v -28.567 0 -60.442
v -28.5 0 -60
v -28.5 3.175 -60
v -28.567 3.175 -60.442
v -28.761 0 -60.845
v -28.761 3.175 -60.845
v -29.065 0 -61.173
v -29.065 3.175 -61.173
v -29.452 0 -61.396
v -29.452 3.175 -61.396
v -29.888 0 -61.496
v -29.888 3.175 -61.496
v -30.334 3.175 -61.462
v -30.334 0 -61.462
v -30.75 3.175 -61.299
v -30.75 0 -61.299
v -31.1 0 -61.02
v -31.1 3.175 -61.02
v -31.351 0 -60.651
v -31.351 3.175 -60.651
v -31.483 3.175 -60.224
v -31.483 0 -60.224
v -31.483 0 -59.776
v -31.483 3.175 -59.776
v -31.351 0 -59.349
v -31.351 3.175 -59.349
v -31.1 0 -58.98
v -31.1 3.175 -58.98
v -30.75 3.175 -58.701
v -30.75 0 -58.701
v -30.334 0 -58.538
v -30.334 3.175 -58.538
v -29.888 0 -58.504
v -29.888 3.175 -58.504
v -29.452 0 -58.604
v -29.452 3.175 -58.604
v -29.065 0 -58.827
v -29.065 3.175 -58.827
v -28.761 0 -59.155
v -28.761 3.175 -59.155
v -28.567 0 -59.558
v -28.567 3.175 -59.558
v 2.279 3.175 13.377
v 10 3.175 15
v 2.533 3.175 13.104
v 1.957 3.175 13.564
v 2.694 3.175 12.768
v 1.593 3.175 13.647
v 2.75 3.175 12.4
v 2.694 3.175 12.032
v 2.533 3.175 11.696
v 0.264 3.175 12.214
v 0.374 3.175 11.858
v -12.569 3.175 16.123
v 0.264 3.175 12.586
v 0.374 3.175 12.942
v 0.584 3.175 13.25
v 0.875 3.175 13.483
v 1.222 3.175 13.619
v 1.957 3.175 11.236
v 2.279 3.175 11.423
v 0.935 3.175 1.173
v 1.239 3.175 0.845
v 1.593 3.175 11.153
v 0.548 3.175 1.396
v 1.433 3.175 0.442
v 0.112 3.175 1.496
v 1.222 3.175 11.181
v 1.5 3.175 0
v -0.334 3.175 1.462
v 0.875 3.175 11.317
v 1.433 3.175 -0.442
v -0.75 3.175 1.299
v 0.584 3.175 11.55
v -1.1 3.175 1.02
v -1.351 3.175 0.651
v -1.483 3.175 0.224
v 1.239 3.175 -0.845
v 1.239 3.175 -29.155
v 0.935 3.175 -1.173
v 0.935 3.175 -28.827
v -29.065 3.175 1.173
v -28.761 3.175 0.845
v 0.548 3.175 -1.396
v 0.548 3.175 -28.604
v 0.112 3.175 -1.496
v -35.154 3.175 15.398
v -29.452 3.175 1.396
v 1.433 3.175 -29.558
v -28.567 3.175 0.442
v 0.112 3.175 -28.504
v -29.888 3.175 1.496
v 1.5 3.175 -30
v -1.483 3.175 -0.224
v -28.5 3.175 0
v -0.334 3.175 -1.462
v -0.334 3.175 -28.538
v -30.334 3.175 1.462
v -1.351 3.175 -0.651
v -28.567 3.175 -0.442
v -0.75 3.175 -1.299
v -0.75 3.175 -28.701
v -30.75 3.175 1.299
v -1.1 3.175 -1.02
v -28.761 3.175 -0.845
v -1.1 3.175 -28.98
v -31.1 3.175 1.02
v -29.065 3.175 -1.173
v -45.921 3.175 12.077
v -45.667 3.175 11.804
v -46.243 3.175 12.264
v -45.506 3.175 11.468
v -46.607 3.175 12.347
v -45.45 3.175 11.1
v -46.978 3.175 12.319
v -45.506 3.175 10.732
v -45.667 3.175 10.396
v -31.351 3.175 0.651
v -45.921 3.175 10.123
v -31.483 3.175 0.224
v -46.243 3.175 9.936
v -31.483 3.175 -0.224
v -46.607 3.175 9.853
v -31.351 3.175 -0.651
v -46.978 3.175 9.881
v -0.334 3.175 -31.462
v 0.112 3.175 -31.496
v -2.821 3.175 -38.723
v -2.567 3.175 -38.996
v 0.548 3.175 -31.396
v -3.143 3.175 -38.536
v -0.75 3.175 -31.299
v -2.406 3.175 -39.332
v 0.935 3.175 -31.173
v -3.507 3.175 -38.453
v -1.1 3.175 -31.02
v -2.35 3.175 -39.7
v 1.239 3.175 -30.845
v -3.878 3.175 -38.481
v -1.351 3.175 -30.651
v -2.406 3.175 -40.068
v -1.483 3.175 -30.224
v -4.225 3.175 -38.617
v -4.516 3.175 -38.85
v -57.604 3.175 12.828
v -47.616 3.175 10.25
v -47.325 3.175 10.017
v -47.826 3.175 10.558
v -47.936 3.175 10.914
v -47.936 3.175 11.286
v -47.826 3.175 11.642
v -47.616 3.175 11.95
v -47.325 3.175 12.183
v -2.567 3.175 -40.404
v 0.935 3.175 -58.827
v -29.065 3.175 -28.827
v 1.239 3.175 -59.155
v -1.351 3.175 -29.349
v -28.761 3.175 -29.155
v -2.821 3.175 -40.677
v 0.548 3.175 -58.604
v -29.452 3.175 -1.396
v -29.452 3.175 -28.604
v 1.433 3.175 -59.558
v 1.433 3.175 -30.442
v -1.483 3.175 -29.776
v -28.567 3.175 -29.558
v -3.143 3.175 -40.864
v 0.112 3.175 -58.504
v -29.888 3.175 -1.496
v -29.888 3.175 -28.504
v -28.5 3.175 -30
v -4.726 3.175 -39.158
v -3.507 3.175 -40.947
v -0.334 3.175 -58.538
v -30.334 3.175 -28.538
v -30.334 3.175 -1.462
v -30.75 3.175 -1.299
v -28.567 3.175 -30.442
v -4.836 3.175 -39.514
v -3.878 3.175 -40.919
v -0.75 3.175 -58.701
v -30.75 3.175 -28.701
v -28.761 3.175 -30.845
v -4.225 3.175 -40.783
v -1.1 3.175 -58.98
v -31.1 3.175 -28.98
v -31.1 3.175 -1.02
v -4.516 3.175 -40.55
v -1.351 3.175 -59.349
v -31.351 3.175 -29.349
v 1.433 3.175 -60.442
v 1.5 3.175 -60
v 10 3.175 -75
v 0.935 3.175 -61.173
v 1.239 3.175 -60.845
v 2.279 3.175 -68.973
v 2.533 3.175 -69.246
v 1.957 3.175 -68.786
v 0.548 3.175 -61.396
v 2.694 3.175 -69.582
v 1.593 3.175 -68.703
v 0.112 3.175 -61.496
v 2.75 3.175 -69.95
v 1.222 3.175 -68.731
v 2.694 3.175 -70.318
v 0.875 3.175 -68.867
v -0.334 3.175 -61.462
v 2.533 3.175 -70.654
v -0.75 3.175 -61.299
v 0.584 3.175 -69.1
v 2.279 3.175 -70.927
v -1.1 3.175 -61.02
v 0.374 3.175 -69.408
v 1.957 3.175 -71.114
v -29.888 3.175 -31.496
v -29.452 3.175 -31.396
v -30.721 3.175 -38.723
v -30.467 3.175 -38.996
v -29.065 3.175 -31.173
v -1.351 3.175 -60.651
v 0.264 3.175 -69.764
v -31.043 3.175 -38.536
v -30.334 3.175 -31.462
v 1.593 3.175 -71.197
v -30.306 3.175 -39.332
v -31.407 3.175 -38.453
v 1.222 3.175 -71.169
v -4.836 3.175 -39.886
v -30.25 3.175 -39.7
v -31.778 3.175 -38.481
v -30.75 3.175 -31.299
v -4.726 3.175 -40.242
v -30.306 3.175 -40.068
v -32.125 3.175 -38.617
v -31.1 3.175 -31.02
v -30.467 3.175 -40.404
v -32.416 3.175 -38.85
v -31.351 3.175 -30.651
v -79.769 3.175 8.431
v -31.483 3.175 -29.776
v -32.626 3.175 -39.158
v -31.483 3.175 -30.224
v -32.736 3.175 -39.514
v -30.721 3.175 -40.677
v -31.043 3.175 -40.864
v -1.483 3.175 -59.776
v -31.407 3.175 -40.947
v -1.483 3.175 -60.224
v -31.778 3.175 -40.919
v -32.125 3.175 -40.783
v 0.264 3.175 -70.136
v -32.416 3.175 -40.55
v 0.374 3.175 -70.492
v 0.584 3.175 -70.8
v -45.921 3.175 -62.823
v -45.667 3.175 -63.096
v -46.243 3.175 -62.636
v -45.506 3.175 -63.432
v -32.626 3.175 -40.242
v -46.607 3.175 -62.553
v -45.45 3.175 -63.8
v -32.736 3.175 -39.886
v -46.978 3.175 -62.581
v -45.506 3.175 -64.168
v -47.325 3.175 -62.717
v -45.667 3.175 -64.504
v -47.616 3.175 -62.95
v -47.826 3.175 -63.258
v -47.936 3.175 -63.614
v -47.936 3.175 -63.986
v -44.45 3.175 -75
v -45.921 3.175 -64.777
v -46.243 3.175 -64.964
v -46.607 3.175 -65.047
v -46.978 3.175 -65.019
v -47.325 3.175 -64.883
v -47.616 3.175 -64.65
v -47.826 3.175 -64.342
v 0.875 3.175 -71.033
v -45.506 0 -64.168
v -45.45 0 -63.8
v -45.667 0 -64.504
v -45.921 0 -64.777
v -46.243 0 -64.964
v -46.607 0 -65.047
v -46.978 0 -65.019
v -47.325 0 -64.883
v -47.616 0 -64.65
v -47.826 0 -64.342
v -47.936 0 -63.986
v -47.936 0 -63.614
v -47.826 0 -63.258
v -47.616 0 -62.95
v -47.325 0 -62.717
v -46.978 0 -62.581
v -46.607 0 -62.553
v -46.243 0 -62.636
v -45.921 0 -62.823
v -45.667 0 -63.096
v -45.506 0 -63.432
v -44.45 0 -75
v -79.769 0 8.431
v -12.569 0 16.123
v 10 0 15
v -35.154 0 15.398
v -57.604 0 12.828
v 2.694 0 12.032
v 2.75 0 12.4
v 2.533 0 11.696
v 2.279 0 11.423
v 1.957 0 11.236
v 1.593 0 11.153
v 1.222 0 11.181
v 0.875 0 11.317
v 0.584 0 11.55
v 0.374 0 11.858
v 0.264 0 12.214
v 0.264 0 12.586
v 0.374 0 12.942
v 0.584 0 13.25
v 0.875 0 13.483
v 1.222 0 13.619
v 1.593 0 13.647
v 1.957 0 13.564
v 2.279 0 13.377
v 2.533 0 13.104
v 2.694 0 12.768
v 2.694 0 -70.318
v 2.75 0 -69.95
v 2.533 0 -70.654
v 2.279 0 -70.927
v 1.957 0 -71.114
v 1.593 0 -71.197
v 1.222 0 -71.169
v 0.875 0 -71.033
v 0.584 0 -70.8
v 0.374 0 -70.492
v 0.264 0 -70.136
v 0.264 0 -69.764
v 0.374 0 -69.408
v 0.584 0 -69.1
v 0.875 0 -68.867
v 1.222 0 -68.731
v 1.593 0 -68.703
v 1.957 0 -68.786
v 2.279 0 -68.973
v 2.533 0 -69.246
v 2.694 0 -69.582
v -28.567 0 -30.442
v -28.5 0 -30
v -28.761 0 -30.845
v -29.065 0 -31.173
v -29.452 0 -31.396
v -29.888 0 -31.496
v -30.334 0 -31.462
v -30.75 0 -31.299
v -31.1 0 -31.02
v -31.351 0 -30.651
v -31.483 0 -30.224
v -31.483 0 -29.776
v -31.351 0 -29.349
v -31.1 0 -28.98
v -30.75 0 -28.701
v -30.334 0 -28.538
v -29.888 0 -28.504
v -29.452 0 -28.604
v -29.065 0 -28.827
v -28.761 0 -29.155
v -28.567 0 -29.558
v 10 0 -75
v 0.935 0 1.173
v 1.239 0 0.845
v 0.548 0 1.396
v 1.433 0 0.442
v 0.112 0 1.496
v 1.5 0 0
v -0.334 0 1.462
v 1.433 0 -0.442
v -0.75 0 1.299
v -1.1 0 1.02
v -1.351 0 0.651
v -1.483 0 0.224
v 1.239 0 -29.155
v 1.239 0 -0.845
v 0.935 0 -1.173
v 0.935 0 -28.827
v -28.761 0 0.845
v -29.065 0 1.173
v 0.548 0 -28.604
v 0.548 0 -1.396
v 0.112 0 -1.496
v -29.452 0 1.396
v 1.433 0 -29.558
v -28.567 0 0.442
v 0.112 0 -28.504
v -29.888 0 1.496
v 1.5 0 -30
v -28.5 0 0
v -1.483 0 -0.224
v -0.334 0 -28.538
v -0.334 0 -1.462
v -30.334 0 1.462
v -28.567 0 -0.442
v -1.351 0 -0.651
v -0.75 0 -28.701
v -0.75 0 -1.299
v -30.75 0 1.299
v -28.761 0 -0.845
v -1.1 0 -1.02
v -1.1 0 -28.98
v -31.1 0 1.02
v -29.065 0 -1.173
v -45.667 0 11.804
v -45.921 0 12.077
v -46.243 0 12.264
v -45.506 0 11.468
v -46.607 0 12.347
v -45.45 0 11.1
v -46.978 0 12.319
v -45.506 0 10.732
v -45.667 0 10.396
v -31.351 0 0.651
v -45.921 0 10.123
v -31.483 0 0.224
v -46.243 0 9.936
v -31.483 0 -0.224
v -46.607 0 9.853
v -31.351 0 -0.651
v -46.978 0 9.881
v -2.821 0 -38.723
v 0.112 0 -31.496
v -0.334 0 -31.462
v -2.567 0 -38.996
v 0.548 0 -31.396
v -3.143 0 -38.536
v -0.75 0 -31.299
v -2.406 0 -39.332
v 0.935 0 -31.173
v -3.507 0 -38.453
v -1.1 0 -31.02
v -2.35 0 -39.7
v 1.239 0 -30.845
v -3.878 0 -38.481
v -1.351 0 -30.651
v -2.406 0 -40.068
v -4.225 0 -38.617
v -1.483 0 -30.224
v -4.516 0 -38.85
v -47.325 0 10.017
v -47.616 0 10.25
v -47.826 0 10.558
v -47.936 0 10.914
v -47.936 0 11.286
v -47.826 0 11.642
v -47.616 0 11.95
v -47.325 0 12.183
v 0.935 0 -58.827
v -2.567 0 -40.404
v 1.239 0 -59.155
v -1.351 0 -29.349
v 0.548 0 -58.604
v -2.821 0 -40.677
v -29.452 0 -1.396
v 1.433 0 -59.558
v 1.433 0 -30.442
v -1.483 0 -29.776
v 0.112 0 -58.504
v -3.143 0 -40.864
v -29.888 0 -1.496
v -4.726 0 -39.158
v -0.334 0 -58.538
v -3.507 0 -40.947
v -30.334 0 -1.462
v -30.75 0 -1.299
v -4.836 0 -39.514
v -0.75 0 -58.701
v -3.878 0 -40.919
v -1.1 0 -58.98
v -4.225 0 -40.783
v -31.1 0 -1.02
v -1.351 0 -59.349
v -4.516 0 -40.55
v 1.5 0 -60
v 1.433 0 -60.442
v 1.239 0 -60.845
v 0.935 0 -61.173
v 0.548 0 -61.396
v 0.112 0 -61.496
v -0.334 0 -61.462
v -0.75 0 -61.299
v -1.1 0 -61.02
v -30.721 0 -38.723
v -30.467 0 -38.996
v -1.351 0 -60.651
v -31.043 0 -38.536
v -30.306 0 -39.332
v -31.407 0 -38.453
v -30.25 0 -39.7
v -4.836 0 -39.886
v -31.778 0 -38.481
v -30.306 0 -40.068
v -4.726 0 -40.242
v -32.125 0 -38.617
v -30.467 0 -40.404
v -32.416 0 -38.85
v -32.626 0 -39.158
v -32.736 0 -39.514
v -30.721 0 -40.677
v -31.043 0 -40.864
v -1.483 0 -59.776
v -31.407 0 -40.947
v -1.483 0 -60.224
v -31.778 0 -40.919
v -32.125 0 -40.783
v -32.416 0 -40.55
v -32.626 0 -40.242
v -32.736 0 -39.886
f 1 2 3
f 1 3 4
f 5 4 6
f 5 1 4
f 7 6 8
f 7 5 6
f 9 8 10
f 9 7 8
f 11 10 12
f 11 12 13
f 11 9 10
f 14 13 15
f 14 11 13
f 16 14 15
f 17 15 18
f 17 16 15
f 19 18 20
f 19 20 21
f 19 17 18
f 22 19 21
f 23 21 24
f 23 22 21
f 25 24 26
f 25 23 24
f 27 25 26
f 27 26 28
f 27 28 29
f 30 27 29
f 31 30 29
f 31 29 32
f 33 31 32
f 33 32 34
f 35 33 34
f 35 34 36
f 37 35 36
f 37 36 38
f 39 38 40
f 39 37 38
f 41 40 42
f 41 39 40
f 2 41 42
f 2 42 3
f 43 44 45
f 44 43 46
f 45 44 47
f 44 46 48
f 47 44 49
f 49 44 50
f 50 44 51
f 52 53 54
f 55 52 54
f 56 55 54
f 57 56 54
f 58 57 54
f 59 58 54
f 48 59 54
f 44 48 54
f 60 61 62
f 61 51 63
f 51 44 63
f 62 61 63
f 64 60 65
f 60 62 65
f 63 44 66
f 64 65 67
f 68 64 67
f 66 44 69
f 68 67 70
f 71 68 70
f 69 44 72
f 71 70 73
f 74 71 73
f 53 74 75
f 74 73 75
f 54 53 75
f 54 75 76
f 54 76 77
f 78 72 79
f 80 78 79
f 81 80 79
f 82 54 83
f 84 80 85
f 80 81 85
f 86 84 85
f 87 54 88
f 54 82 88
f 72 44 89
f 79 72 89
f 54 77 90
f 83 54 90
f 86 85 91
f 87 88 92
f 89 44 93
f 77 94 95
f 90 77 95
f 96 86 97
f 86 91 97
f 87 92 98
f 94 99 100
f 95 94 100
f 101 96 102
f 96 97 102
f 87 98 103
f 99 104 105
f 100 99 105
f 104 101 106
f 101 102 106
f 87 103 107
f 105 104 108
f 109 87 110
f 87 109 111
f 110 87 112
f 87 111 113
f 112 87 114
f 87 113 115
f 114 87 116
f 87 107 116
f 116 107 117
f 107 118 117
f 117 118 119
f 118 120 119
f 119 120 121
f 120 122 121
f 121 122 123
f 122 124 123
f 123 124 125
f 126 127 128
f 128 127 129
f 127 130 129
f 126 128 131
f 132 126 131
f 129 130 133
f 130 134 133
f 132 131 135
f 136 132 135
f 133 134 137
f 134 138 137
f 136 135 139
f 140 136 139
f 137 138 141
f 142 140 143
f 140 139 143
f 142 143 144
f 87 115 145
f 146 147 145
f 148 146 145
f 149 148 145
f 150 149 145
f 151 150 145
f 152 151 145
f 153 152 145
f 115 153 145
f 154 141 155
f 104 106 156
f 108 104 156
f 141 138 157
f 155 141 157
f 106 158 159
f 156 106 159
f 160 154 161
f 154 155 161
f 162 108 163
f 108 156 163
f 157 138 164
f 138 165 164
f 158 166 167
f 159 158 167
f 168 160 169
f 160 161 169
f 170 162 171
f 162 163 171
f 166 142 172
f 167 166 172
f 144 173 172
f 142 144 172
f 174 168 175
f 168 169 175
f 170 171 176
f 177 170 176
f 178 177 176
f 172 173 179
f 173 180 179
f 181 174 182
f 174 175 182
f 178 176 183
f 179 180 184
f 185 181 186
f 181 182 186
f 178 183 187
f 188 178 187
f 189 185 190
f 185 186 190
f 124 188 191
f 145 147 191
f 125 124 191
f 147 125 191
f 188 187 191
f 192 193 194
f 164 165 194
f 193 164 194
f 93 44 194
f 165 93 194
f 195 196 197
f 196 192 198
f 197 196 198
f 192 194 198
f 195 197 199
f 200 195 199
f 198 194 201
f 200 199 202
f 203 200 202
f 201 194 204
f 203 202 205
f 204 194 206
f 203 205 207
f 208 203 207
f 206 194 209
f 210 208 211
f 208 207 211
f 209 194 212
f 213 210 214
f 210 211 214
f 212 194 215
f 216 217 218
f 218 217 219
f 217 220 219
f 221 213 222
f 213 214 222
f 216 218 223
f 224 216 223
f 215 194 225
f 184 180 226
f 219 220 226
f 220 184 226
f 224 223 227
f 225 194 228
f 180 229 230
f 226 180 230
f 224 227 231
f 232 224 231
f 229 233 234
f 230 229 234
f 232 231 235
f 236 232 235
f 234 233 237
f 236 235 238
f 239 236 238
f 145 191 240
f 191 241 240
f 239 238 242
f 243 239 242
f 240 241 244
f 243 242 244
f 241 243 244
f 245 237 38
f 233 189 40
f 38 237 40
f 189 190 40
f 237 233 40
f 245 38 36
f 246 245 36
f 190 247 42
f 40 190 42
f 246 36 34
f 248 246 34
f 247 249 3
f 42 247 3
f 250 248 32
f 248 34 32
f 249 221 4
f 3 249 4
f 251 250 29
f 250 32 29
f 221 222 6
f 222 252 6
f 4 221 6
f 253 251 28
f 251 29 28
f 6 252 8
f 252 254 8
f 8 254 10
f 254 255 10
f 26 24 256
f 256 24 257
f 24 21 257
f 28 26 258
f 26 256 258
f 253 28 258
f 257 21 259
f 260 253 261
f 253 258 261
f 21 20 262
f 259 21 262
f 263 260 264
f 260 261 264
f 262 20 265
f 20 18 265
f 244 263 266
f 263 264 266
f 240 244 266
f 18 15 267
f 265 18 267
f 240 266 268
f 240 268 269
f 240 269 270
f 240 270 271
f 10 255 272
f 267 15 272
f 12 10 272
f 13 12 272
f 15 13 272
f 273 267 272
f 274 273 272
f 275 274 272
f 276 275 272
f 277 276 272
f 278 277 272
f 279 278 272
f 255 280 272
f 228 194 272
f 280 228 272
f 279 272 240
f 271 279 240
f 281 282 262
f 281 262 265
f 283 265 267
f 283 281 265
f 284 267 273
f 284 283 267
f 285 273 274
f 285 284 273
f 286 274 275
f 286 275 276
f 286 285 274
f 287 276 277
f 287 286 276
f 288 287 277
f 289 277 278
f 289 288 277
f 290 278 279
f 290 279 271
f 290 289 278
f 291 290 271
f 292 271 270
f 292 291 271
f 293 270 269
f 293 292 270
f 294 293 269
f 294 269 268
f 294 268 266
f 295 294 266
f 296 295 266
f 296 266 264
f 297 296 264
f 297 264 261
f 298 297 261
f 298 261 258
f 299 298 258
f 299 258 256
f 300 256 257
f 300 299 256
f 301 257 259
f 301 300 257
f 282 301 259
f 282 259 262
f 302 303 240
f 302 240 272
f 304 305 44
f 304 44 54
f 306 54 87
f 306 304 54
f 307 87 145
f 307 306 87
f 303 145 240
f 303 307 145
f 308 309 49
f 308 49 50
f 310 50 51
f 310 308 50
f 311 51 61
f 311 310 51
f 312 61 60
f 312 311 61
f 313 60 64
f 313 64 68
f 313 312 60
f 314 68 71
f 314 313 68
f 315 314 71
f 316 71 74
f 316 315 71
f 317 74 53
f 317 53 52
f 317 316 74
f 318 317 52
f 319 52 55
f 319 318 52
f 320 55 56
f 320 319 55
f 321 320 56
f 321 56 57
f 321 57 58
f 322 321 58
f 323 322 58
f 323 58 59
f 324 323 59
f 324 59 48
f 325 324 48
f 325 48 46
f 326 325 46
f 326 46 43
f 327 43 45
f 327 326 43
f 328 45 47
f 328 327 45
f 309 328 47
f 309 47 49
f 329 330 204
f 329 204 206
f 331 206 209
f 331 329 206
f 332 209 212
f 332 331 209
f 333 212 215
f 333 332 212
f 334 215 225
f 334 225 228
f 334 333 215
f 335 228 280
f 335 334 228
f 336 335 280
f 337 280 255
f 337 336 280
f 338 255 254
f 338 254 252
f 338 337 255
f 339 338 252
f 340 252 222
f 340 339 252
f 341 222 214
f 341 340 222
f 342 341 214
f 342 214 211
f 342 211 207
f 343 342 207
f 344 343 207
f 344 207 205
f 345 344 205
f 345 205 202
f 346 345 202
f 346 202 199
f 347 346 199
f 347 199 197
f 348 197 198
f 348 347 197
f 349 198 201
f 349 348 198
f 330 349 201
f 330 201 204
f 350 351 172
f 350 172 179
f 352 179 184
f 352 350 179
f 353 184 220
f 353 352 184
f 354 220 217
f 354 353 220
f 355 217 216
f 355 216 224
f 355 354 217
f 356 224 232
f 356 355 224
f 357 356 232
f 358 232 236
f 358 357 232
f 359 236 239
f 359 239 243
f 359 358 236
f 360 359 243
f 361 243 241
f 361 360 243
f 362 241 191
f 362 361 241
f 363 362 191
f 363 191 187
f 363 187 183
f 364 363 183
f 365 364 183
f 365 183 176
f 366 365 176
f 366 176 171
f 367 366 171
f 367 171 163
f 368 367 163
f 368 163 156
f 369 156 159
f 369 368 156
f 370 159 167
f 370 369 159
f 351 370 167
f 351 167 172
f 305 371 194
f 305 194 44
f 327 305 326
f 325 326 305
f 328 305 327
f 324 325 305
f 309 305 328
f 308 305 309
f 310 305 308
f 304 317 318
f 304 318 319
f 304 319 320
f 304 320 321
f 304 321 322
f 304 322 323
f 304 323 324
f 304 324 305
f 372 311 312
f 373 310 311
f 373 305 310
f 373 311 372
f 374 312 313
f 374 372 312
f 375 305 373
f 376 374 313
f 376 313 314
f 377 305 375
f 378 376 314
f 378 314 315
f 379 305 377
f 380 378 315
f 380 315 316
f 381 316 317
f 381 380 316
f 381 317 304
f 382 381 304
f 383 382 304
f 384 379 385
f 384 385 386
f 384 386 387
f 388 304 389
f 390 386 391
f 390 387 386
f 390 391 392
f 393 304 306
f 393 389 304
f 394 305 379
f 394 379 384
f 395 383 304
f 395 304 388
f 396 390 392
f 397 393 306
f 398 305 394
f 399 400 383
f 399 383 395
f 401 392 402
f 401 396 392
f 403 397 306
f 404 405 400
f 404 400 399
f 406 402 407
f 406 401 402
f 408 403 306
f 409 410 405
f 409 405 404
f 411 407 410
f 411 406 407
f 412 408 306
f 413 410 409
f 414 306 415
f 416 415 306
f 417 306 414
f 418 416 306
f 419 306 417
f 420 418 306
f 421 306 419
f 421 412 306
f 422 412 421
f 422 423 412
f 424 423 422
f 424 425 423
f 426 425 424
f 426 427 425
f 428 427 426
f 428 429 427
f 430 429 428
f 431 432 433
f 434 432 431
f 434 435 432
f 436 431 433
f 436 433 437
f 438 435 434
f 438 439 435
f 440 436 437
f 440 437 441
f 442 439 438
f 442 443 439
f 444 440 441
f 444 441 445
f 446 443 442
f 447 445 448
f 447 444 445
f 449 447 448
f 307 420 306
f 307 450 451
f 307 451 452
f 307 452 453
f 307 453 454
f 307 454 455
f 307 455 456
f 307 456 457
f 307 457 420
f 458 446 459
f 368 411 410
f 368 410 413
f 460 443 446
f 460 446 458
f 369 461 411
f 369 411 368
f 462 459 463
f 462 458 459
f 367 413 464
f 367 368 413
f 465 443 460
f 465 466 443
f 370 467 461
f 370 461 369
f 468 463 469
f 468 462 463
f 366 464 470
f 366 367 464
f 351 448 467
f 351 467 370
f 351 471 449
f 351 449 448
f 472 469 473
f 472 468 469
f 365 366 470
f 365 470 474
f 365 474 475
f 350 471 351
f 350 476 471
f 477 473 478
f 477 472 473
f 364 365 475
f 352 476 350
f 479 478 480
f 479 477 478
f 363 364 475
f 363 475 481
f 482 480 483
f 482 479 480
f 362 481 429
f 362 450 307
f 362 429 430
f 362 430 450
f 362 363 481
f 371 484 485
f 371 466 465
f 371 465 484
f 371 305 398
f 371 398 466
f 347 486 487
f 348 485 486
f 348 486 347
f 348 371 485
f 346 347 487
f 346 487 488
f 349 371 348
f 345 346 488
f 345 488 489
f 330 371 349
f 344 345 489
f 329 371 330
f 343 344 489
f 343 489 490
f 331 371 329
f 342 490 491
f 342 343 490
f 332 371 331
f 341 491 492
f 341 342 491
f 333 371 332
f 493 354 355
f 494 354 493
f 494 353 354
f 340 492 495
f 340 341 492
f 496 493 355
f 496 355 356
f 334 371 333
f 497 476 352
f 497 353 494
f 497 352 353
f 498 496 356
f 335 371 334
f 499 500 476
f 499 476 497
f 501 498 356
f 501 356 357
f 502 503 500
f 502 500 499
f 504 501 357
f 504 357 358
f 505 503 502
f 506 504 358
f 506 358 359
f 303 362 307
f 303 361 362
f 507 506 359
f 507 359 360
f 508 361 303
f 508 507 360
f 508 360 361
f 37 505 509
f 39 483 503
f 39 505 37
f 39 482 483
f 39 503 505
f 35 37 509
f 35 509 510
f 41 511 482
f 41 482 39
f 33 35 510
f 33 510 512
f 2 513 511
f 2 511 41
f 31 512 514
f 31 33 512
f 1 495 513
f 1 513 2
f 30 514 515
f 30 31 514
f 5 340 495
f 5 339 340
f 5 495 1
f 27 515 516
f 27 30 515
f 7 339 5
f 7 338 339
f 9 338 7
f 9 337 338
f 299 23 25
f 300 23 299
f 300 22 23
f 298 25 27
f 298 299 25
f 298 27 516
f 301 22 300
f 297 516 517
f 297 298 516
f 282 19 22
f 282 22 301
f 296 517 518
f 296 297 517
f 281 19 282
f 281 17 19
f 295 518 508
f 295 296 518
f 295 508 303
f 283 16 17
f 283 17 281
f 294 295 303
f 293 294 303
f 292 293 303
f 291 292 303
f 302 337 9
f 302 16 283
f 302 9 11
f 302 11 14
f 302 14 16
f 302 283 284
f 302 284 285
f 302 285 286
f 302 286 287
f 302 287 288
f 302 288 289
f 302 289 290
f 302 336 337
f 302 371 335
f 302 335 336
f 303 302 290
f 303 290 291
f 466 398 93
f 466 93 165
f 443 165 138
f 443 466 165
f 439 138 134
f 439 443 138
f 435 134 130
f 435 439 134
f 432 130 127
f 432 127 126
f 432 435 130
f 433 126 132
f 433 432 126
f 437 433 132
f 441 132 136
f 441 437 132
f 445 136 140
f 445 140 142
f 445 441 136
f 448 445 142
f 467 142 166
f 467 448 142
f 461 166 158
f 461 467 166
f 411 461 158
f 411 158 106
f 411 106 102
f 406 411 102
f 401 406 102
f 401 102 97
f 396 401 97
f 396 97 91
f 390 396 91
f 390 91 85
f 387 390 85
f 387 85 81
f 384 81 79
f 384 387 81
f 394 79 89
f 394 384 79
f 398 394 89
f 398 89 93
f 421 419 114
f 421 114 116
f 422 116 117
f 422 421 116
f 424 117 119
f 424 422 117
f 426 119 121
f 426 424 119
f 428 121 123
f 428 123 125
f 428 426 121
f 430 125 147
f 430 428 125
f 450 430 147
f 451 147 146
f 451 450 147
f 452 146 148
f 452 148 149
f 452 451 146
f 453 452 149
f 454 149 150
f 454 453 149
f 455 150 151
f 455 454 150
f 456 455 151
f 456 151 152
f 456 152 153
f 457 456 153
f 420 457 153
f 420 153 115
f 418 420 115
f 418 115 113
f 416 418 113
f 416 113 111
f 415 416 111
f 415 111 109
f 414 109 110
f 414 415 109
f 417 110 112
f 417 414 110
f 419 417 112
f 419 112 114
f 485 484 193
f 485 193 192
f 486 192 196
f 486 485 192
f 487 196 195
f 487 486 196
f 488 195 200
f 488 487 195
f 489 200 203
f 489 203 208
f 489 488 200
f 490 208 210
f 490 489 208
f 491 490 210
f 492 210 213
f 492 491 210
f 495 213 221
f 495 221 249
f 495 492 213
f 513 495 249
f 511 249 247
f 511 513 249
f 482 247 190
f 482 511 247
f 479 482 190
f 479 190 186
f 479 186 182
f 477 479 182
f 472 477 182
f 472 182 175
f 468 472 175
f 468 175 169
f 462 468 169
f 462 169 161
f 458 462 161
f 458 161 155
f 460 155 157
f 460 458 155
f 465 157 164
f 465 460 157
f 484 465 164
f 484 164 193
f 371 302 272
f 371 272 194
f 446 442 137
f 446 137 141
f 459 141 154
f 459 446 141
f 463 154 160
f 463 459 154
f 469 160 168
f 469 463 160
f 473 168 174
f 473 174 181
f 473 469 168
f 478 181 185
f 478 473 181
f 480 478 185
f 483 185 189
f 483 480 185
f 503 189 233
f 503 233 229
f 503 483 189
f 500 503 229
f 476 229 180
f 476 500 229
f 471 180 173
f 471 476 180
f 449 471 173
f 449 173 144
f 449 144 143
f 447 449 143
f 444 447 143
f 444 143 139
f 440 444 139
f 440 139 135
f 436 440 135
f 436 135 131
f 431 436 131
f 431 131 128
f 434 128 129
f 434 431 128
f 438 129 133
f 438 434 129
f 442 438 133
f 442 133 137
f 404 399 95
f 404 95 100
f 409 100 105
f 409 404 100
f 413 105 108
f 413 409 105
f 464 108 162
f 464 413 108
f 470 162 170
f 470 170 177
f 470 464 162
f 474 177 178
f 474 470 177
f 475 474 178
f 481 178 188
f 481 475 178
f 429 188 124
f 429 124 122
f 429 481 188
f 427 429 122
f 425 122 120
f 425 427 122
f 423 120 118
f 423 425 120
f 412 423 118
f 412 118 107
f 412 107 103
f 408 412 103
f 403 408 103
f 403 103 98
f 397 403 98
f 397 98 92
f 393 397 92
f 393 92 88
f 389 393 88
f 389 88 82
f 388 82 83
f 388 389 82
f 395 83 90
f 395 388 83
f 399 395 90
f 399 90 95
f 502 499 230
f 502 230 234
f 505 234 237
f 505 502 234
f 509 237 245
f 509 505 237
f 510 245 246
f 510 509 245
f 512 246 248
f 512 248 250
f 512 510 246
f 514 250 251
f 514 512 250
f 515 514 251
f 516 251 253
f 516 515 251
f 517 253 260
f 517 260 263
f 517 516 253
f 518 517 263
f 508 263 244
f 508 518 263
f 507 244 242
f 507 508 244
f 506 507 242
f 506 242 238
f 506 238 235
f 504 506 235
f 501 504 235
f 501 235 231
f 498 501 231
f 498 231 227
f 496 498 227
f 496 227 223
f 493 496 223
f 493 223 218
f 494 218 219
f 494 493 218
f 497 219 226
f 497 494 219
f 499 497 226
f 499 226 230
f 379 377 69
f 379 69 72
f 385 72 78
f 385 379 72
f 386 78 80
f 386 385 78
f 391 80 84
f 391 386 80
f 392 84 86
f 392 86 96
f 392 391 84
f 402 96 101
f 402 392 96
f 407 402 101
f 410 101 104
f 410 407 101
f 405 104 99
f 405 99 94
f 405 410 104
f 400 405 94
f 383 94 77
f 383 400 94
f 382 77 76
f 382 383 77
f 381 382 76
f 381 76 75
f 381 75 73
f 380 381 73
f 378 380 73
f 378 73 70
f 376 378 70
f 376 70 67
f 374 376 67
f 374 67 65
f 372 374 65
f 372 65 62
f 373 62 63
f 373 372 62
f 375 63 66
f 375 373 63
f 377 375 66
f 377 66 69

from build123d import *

# Parameters (mm, degrees)
SKETCH1_R           = 1.5
SKETCH1_R_2         = 1.25
BOSS_EXTRUDE1_DEPTH = 3.175


with BuildPart() as part:
    # Sketch1 → Boss-Extrude1 (new body)
    with BuildSketch(Plane(origin=(0, 0, 0), x_dir=(1, 0, 0), z_dir=(0, 1, 0))):
        with BuildLine():
            Line((-44.45, 75), (10, 75))
            Line((10, 75), (10, -15))
            ThreePointArc((10, -15), (-35.153948529, -15.397564184), (-79.768950839, -8.430592532))
            Line((-79.768950839, -8.430592532), (-44.45, 75))
        make_face()
        Circle(SKETCH1_R, mode=Mode.SUBTRACT)
        with Locations((-30, 0)):
            Circle(SKETCH1_R, mode=Mode.SUBTRACT)
        with Locations((-30, 30)):
            Circle(SKETCH1_R, mode=Mode.SUBTRACT)
        with Locations((-30, 60)):
            Circle(SKETCH1_R, mode=Mode.SUBTRACT)
        with Locations((0, 60)):
            Circle(SKETCH1_R, mode=Mode.SUBTRACT)
        with Locations((0, 30)):
            Circle(SKETCH1_R, mode=Mode.SUBTRACT)
        with Locations((-46.7, 63.8)):
            Circle(SKETCH1_R_2, mode=Mode.SUBTRACT)
        with Locations((1.5, 69.95)):
            Circle(SKETCH1_R_2, mode=Mode.SUBTRACT)
        with Locations((-31.5, 39.7)):
            Circle(SKETCH1_R_2, mode=Mode.SUBTRACT)
        with Locations((-3.6, 39.7)):
            Circle(SKETCH1_R_2, mode=Mode.SUBTRACT)
        with Locations((-46.7, -11.1)):
            Circle(SKETCH1_R_2, mode=Mode.SUBTRACT)
        with Locations((1.5, -12.4)):
            Circle(SKETCH1_R_2, mode=Mode.SUBTRACT)
    extrude(amount=BOSS_EXTRUDE1_DEPTH)


solid = part.part
